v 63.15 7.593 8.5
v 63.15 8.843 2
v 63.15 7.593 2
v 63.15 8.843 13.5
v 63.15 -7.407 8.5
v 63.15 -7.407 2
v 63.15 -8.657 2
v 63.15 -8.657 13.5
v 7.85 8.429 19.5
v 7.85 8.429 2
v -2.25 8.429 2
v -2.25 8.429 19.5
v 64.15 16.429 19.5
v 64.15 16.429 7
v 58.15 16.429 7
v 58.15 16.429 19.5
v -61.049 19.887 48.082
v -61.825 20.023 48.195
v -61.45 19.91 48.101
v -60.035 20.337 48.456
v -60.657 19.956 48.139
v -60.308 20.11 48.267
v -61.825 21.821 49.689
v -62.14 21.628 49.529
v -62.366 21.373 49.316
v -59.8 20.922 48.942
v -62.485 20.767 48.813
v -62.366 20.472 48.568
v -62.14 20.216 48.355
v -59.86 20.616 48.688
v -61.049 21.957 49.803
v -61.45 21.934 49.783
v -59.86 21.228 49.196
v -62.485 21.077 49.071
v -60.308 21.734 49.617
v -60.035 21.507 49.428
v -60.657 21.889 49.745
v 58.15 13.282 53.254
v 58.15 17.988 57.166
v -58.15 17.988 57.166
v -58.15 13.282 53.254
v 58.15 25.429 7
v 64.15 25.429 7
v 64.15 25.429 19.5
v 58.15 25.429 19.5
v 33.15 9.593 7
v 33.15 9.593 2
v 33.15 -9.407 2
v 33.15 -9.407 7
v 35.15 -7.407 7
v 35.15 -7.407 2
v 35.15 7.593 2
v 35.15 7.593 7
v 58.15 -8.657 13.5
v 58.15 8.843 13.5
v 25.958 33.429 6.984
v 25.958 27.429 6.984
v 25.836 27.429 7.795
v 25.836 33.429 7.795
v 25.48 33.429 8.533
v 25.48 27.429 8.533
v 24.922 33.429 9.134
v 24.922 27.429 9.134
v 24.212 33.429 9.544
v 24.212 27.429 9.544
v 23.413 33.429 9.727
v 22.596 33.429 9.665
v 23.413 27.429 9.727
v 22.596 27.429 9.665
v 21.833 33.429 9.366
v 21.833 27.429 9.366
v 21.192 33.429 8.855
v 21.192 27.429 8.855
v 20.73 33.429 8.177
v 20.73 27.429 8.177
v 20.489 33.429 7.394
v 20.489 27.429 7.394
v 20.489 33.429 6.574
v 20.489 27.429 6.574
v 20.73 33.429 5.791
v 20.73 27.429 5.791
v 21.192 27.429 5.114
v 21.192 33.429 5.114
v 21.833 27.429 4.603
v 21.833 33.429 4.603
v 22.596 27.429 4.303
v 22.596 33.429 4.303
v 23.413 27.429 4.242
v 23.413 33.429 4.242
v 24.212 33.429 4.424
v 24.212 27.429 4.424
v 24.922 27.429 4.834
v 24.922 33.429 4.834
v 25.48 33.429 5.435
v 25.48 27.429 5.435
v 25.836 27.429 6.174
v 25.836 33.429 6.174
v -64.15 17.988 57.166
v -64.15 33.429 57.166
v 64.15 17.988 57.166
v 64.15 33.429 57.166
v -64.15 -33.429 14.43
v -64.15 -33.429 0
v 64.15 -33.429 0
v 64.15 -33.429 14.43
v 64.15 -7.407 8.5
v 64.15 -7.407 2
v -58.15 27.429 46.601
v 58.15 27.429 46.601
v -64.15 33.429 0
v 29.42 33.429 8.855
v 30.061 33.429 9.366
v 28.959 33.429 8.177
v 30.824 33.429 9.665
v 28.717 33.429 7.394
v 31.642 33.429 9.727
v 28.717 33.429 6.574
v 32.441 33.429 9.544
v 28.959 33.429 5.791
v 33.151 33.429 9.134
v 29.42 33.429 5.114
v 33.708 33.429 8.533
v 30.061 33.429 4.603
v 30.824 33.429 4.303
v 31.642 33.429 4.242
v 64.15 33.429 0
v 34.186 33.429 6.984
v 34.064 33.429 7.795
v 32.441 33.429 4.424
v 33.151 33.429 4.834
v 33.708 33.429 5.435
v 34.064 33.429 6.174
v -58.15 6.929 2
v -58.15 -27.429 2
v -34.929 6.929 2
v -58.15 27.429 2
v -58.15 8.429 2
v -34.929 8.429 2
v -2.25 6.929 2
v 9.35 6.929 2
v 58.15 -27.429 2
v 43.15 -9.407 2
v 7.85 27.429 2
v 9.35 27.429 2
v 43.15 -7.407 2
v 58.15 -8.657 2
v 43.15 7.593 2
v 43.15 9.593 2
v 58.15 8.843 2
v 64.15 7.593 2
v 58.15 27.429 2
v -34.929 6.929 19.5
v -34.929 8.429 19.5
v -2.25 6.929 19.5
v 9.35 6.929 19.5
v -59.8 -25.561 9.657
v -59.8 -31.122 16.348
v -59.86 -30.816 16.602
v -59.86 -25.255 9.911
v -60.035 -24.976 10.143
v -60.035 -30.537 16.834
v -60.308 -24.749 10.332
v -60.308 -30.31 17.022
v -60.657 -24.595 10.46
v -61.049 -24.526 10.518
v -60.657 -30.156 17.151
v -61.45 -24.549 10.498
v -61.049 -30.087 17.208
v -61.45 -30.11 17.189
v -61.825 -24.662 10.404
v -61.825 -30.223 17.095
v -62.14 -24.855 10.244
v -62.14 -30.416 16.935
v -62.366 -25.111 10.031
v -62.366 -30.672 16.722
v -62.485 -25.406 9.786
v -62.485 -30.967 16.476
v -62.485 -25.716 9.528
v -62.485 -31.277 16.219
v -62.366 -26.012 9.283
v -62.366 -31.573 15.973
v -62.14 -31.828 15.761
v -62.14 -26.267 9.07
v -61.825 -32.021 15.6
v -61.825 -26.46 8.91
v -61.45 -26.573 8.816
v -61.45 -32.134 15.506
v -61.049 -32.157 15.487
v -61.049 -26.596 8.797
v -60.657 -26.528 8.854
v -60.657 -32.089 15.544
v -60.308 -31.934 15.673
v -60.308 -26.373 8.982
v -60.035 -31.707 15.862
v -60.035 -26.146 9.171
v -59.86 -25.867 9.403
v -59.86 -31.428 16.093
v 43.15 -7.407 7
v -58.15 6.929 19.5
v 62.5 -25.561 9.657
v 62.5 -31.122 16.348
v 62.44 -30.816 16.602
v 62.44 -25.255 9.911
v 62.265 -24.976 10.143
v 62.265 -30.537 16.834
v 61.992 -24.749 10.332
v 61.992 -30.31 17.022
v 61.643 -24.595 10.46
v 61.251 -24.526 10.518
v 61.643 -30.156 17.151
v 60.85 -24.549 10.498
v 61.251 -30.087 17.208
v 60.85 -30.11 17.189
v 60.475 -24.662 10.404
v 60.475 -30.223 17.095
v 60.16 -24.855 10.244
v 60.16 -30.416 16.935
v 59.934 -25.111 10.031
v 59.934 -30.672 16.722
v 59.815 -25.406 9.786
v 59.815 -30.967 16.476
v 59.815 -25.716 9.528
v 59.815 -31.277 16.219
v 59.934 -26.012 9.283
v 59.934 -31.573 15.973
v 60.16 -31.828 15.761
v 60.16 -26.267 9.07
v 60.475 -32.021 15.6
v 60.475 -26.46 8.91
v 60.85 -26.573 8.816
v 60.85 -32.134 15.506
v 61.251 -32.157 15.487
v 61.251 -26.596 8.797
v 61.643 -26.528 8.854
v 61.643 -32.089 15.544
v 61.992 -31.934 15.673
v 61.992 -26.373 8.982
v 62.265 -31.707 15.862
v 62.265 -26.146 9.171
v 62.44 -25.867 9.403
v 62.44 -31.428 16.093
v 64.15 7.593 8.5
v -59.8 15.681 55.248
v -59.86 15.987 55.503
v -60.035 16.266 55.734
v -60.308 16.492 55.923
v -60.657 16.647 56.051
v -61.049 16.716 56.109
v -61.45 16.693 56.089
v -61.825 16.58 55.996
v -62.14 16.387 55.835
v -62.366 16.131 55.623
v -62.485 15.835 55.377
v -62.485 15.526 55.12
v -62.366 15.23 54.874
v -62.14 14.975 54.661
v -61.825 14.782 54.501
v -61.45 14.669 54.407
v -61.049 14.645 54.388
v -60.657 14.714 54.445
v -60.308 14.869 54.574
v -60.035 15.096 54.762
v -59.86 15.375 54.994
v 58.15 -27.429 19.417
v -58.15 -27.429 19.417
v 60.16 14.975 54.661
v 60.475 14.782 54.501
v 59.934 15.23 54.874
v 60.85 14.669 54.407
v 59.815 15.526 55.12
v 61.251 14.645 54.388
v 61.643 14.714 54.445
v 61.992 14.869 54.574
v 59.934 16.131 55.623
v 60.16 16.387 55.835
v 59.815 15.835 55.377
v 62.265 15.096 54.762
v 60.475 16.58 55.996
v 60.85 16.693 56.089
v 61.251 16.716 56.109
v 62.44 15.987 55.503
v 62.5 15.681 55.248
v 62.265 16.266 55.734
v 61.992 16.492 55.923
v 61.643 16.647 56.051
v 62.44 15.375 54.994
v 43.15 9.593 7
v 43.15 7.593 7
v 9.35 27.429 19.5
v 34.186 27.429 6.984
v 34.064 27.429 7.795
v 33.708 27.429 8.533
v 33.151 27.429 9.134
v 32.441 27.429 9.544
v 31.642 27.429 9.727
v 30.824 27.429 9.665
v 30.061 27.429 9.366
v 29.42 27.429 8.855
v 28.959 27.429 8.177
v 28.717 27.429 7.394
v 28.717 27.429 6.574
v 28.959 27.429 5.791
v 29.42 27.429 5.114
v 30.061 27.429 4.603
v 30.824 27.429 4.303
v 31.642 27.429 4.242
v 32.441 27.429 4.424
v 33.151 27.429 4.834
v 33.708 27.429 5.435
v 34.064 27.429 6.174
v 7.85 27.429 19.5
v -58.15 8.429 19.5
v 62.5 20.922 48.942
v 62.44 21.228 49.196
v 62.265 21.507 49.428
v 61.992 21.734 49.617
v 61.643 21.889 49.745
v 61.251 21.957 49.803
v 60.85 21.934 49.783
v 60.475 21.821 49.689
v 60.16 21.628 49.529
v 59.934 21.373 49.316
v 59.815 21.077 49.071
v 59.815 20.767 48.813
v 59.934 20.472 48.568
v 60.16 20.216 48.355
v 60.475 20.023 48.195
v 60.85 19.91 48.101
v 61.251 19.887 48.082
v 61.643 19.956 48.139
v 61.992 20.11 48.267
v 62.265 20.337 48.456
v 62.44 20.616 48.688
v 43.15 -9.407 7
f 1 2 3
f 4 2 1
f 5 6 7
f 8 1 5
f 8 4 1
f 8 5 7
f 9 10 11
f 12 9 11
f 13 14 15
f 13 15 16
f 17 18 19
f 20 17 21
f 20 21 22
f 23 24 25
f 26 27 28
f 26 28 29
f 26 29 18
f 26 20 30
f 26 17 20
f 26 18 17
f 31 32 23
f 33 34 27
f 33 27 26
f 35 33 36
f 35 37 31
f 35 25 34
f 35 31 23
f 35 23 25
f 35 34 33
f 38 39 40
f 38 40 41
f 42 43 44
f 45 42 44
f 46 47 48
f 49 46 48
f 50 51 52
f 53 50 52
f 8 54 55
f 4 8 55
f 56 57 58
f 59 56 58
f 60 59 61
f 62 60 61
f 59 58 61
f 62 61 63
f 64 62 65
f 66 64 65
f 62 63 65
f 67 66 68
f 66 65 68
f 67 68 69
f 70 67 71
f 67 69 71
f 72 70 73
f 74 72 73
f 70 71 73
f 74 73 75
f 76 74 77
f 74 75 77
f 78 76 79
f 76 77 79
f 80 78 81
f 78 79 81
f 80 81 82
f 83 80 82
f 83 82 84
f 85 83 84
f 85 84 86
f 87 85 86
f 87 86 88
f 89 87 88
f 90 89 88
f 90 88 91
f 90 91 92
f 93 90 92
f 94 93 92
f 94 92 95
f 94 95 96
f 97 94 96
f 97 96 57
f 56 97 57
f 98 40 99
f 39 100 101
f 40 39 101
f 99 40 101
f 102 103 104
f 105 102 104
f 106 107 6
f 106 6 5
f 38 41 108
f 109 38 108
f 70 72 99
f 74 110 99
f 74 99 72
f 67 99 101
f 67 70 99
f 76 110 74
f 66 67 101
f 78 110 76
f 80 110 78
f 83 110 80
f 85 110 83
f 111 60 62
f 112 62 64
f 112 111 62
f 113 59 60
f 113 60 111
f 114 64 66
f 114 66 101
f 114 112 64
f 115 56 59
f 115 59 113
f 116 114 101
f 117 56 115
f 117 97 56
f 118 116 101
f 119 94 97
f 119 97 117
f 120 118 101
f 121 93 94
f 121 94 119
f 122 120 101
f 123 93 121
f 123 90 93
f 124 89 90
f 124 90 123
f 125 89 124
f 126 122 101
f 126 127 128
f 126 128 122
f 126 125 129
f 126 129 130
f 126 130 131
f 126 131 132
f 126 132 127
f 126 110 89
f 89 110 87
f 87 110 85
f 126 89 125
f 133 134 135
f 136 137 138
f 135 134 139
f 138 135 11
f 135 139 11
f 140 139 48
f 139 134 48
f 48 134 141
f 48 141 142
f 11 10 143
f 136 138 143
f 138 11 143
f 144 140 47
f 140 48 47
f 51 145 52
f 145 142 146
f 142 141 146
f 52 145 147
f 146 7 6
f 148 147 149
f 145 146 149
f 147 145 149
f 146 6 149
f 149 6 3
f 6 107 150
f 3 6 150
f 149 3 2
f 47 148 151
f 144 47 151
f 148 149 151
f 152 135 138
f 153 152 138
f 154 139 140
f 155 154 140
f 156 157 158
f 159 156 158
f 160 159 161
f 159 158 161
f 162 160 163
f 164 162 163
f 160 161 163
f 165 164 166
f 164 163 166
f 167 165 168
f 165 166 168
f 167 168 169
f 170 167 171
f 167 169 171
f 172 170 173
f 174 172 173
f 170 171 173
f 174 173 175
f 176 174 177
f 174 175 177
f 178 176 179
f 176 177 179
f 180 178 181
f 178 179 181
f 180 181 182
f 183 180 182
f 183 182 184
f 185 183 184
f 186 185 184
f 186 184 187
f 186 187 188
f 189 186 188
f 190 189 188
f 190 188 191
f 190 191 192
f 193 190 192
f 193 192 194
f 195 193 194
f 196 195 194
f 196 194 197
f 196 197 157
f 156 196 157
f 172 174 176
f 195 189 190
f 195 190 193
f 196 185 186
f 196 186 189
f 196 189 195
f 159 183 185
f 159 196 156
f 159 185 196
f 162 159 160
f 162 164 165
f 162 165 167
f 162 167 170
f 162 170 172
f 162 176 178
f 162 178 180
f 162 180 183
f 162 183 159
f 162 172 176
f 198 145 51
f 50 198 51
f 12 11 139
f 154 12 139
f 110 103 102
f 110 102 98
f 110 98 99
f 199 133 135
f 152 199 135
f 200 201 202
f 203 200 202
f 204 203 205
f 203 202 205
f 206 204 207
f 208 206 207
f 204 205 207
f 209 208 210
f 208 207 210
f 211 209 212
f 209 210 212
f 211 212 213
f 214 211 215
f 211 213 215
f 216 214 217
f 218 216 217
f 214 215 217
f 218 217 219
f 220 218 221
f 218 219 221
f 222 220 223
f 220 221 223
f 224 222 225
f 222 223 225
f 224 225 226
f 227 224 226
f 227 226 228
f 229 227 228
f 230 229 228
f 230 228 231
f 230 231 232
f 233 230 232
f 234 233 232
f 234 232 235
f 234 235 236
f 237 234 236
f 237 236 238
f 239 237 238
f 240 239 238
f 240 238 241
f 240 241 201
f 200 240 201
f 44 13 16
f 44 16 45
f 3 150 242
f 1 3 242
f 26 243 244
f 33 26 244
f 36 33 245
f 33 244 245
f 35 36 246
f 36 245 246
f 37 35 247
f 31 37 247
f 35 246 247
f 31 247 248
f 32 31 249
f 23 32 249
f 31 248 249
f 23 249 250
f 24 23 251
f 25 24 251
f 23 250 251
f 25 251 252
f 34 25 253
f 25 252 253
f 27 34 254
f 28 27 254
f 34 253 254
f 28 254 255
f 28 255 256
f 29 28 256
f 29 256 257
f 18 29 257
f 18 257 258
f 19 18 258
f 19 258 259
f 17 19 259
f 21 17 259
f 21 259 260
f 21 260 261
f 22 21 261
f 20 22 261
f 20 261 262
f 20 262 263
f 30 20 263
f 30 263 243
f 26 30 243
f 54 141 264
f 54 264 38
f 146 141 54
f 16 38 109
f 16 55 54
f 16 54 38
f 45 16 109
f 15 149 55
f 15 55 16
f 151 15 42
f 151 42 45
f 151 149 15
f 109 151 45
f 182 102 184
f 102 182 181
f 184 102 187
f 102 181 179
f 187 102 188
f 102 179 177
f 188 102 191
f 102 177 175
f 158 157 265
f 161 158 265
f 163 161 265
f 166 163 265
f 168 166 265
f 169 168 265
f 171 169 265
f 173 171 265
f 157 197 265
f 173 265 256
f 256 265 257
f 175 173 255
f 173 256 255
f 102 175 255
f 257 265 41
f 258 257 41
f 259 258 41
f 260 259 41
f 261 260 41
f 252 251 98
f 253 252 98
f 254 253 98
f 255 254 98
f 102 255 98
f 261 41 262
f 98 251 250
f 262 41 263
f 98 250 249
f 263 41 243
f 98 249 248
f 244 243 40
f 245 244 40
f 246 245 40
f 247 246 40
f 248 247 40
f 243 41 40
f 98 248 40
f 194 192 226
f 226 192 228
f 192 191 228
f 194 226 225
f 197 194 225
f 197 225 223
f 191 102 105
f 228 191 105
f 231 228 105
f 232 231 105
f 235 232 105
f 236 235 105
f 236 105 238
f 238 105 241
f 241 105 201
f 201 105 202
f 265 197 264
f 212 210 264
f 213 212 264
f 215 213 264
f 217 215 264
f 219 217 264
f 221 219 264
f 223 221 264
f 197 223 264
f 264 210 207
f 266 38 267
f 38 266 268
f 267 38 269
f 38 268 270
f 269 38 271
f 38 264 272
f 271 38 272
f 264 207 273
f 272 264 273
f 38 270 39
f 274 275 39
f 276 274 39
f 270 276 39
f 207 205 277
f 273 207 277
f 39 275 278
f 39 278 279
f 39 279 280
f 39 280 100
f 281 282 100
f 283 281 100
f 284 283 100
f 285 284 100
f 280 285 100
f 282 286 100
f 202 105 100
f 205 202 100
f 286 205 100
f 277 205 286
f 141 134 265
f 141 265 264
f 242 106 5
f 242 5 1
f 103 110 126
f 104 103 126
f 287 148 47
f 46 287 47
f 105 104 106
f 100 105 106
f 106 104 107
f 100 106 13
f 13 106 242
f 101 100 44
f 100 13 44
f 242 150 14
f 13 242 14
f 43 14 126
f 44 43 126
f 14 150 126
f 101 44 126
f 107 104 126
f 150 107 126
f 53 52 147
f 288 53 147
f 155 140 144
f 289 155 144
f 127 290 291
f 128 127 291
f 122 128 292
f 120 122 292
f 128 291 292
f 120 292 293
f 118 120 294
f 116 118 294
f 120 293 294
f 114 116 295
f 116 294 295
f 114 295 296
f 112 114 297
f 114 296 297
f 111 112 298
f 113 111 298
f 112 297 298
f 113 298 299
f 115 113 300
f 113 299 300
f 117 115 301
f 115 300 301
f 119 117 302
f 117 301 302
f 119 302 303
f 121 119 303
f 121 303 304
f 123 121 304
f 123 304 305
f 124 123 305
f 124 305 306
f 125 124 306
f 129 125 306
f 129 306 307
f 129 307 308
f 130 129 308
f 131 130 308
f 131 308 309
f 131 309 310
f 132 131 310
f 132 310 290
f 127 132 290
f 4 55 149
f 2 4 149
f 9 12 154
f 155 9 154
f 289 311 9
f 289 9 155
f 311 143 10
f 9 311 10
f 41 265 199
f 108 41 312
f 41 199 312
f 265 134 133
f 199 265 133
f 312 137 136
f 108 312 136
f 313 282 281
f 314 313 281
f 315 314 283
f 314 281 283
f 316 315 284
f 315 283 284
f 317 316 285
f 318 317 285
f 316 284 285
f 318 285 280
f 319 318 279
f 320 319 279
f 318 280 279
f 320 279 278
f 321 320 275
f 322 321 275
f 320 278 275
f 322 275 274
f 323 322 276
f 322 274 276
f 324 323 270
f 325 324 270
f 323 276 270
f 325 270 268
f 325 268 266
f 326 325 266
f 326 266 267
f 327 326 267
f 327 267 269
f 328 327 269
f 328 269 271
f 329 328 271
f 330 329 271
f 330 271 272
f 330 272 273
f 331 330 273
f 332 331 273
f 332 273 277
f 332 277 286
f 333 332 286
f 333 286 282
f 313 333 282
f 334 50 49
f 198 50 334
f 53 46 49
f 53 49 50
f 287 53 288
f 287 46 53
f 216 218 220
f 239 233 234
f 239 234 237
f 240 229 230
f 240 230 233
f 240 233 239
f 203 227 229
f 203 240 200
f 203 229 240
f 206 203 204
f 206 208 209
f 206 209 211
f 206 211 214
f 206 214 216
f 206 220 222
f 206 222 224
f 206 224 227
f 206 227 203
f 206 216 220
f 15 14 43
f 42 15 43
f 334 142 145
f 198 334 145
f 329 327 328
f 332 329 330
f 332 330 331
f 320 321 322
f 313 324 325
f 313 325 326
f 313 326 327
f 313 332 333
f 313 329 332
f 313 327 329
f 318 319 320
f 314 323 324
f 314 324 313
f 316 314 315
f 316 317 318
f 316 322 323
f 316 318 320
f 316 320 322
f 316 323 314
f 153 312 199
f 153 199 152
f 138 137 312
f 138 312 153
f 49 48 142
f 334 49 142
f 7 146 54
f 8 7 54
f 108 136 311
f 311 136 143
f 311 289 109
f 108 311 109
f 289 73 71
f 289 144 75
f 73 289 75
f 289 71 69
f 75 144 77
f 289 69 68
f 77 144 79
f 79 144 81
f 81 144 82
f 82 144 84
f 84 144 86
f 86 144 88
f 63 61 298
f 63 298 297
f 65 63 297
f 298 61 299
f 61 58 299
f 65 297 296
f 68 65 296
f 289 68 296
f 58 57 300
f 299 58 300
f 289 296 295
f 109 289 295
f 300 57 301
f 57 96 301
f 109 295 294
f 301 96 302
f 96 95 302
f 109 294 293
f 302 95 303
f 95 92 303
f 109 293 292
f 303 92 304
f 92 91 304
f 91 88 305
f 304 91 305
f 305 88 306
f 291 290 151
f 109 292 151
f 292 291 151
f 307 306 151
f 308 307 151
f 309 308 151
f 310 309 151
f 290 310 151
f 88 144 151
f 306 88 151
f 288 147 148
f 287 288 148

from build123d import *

# Parameters (mm, degrees)
F0_W      = 128.3
F0_H      = 66.85852
F0_W_2    = 116.3
F0_H_2    = 54.85852
F1_DEPTH  = 70
F2_DEPTH  = 2
F4_DEPTH  = 130
F5_W      = 9
F5_H      = 12.5
F6_DEPTH  = 7
F5_W_2    = 15
F5_H_2    = 6.5
F7_DEPTH  = 7
F9_DEPTH  = 5
F11_DEPTH = 5
F12_W     = 23.2212013245
F12_H     = 1.5
F13_DEPTH = 17.5
F15_R     = 1.35
F16_DEPTH = 9.5
F18_DEPTH = 141.4
F19_DEPTH = 133.9
F21_DEPTH = 128.26
F22_DEPTH = 9
F23_R     = 2.75
F24_DEPTH = 25


with BuildPart() as f1:
    # F0 (on Top) → F1 (new body)
    with BuildSketch(Plane.XY):
        Rectangle(F0_W, F0_H)
        Rectangle(F0_W_2, F0_H_2, mode=Mode.SUBTRACT)
    extrude(amount=F1_DEPTH)

    # F0 (on Top) → F2 (join)
    with BuildSketch(Plane.XY):
        Rectangle(F0_W_2, F0_H_2)
    extrude(amount=F2_DEPTH)

    # F3 (on face) → F4 (cut)
    with BuildSketch(Plane.YZ.offset(64.15)):
        Polygon((-33.42926, 14.4301047549), (33.42926, 70), (-33.42926, 70), align=None)
    extrude(amount=-F4_DEPTH, mode=Mode.SUBTRACT)

    # F5 (on face) → F6 (cut)
    with BuildSketch(Plane.YZ.offset(64.15)):
        with Locations((20.92926, 13.25)):
            Rectangle(F5_W, F5_H)
    extrude(amount=-F6_DEPTH, mode=Mode.SUBTRACT)

    # F5 (on face) → F7 (cut)
    with BuildSketch(Plane.YZ.offset(64.15)):
        with Locations((0.0932381302, 5.25)):
            Rectangle(F5_W_2, F5_H_2)
    extrude(amount=-F7_DEPTH, mode=Mode.SUBTRACT)

    # F8 (on face) → F9 (cut)
    with BuildSketch(Plane(origin=(58.15, 0, 0), x_dir=(0, -1, 0), z_dir=(-1, 0, 0))):
        Polygon((-8.8432381302, 13.5), (-8.8432381302, 2), (-7.5932381302, 2), (-7.5932381302, 8.5), (7.4067618698, 8.5), (7.4067618698, 2), (8.6567618698, 2), (8.6567618698, 13.5), align=None)
    extrude(amount=-F9_DEPTH, mode=Mode.SUBTRACT)

    # F10 (on face) → F11 (join)
    with BuildSketch(Plane.XY.offset(2)):
        Polygon((33.15, 9.5932381302), (33.15, 7.5932381302), (33.15, -7.4067618698), (33.15, -9.4067618698), (43.15, -9.4067618698), (43.15, -7.4067618698), (35.15, -7.4067618698), (35.15, 7.5932381302), (43.15, 7.5932381302), (43.15, 9.5932381302), align=None)
    extrude(amount=F11_DEPTH)

    # F12 (on face) → F13 (join)
    with BuildSketch(Plane.XY.offset(2)):
        with Locations((-46.5393993378, 7.67926)):
            Rectangle(F12_W, F12_H)
        Polygon((9.35, 27.42926), (7.85, 27.42926), (7.85, 8.42926), (-2.2495171815, 8.42926), (-2.2495171815, 6.92926), (9.35, 6.92926), (9.35, 8.42926), align=None)
    extrude(amount=F13_DEPTH)

    # F15 (on offset) → F16 (cut)
    with BuildSketch(Plane(origin=(0, -21.2629991115, 25.582424532), x_dir=(1, 0, 0), z_dir=(0, -0.6391959003, 0.7690439526))):
        with Locations((-61.15, -13.4849064425)):
            Circle(F15_R)
        with Locations((61.15, -13.4849064425)):
            Circle(F15_R)
    extrude(amount=-F16_DEPTH, mode=Mode.SUBTRACT)

    # F17 (on face) → F18 (cut)
    with BuildSketch(Plane.YZ.offset(64.15)):
        Polygon((92.054369559, 57.1661034537), (92.054369559, 115.2663065398), (-2.9636703822, 115.2663065398), (-2.9636703822, 57.1661034537), (17.9882496267, 57.1661034537), (33.42926, 70), (33.42926, 57.1661034537), align=None)
    extrude(amount=-F18_DEPTH, mode=Mode.SUBTRACT)

    # F17 (on face) → F19 (cut)
    with BuildSketch(Plane.YZ.offset(64.15)):
        Polygon((17.9882496267, 57.1661034537), (33.42926, 57.1661034537), (33.42926, 70), align=None)
    extrude(amount=-F19_DEPTH, mode=Mode.SUBTRACT)

    # F20 (on face) → F21 (join)
    with BuildSketch(Plane.YZ.offset(64.15)):
        Polygon((17.9882496267, 57.1661034537), (13.2818869306, 53.254379383), (33.42926, 43.7797382474), (33.42926, 57.1661034537), align=None)
    extrude(amount=-F21_DEPTH)

    # F15 (on offset) → F22 (cut)
    with BuildSketch(Plane(origin=(0, -21.2629991115, 25.582424532), x_dir=(1, 0, 0), z_dir=(0, -0.6391959003, 0.7690439526))):
        with Locations((61.15, 47.3736135575)):
            Circle(F15_R)
        with Locations((-61.15, 47.3736135575)):
            Circle(F15_R)
    extrude(amount=-F22_DEPTH, mode=Mode.SUBTRACT)

    # F23 (on face) → F24 (cut)
    with BuildSketch(Plane.XZ.offset(-27.42926)):
        with Locations((23.2078029529, 6.984276909)):
            Circle(F23_R)
        with Locations((31.4362019996, 6.984276909)):
            Circle(F23_R)
    extrude(amount=-F24_DEPTH, mode=Mode.SUBTRACT)


solid = f1.part
